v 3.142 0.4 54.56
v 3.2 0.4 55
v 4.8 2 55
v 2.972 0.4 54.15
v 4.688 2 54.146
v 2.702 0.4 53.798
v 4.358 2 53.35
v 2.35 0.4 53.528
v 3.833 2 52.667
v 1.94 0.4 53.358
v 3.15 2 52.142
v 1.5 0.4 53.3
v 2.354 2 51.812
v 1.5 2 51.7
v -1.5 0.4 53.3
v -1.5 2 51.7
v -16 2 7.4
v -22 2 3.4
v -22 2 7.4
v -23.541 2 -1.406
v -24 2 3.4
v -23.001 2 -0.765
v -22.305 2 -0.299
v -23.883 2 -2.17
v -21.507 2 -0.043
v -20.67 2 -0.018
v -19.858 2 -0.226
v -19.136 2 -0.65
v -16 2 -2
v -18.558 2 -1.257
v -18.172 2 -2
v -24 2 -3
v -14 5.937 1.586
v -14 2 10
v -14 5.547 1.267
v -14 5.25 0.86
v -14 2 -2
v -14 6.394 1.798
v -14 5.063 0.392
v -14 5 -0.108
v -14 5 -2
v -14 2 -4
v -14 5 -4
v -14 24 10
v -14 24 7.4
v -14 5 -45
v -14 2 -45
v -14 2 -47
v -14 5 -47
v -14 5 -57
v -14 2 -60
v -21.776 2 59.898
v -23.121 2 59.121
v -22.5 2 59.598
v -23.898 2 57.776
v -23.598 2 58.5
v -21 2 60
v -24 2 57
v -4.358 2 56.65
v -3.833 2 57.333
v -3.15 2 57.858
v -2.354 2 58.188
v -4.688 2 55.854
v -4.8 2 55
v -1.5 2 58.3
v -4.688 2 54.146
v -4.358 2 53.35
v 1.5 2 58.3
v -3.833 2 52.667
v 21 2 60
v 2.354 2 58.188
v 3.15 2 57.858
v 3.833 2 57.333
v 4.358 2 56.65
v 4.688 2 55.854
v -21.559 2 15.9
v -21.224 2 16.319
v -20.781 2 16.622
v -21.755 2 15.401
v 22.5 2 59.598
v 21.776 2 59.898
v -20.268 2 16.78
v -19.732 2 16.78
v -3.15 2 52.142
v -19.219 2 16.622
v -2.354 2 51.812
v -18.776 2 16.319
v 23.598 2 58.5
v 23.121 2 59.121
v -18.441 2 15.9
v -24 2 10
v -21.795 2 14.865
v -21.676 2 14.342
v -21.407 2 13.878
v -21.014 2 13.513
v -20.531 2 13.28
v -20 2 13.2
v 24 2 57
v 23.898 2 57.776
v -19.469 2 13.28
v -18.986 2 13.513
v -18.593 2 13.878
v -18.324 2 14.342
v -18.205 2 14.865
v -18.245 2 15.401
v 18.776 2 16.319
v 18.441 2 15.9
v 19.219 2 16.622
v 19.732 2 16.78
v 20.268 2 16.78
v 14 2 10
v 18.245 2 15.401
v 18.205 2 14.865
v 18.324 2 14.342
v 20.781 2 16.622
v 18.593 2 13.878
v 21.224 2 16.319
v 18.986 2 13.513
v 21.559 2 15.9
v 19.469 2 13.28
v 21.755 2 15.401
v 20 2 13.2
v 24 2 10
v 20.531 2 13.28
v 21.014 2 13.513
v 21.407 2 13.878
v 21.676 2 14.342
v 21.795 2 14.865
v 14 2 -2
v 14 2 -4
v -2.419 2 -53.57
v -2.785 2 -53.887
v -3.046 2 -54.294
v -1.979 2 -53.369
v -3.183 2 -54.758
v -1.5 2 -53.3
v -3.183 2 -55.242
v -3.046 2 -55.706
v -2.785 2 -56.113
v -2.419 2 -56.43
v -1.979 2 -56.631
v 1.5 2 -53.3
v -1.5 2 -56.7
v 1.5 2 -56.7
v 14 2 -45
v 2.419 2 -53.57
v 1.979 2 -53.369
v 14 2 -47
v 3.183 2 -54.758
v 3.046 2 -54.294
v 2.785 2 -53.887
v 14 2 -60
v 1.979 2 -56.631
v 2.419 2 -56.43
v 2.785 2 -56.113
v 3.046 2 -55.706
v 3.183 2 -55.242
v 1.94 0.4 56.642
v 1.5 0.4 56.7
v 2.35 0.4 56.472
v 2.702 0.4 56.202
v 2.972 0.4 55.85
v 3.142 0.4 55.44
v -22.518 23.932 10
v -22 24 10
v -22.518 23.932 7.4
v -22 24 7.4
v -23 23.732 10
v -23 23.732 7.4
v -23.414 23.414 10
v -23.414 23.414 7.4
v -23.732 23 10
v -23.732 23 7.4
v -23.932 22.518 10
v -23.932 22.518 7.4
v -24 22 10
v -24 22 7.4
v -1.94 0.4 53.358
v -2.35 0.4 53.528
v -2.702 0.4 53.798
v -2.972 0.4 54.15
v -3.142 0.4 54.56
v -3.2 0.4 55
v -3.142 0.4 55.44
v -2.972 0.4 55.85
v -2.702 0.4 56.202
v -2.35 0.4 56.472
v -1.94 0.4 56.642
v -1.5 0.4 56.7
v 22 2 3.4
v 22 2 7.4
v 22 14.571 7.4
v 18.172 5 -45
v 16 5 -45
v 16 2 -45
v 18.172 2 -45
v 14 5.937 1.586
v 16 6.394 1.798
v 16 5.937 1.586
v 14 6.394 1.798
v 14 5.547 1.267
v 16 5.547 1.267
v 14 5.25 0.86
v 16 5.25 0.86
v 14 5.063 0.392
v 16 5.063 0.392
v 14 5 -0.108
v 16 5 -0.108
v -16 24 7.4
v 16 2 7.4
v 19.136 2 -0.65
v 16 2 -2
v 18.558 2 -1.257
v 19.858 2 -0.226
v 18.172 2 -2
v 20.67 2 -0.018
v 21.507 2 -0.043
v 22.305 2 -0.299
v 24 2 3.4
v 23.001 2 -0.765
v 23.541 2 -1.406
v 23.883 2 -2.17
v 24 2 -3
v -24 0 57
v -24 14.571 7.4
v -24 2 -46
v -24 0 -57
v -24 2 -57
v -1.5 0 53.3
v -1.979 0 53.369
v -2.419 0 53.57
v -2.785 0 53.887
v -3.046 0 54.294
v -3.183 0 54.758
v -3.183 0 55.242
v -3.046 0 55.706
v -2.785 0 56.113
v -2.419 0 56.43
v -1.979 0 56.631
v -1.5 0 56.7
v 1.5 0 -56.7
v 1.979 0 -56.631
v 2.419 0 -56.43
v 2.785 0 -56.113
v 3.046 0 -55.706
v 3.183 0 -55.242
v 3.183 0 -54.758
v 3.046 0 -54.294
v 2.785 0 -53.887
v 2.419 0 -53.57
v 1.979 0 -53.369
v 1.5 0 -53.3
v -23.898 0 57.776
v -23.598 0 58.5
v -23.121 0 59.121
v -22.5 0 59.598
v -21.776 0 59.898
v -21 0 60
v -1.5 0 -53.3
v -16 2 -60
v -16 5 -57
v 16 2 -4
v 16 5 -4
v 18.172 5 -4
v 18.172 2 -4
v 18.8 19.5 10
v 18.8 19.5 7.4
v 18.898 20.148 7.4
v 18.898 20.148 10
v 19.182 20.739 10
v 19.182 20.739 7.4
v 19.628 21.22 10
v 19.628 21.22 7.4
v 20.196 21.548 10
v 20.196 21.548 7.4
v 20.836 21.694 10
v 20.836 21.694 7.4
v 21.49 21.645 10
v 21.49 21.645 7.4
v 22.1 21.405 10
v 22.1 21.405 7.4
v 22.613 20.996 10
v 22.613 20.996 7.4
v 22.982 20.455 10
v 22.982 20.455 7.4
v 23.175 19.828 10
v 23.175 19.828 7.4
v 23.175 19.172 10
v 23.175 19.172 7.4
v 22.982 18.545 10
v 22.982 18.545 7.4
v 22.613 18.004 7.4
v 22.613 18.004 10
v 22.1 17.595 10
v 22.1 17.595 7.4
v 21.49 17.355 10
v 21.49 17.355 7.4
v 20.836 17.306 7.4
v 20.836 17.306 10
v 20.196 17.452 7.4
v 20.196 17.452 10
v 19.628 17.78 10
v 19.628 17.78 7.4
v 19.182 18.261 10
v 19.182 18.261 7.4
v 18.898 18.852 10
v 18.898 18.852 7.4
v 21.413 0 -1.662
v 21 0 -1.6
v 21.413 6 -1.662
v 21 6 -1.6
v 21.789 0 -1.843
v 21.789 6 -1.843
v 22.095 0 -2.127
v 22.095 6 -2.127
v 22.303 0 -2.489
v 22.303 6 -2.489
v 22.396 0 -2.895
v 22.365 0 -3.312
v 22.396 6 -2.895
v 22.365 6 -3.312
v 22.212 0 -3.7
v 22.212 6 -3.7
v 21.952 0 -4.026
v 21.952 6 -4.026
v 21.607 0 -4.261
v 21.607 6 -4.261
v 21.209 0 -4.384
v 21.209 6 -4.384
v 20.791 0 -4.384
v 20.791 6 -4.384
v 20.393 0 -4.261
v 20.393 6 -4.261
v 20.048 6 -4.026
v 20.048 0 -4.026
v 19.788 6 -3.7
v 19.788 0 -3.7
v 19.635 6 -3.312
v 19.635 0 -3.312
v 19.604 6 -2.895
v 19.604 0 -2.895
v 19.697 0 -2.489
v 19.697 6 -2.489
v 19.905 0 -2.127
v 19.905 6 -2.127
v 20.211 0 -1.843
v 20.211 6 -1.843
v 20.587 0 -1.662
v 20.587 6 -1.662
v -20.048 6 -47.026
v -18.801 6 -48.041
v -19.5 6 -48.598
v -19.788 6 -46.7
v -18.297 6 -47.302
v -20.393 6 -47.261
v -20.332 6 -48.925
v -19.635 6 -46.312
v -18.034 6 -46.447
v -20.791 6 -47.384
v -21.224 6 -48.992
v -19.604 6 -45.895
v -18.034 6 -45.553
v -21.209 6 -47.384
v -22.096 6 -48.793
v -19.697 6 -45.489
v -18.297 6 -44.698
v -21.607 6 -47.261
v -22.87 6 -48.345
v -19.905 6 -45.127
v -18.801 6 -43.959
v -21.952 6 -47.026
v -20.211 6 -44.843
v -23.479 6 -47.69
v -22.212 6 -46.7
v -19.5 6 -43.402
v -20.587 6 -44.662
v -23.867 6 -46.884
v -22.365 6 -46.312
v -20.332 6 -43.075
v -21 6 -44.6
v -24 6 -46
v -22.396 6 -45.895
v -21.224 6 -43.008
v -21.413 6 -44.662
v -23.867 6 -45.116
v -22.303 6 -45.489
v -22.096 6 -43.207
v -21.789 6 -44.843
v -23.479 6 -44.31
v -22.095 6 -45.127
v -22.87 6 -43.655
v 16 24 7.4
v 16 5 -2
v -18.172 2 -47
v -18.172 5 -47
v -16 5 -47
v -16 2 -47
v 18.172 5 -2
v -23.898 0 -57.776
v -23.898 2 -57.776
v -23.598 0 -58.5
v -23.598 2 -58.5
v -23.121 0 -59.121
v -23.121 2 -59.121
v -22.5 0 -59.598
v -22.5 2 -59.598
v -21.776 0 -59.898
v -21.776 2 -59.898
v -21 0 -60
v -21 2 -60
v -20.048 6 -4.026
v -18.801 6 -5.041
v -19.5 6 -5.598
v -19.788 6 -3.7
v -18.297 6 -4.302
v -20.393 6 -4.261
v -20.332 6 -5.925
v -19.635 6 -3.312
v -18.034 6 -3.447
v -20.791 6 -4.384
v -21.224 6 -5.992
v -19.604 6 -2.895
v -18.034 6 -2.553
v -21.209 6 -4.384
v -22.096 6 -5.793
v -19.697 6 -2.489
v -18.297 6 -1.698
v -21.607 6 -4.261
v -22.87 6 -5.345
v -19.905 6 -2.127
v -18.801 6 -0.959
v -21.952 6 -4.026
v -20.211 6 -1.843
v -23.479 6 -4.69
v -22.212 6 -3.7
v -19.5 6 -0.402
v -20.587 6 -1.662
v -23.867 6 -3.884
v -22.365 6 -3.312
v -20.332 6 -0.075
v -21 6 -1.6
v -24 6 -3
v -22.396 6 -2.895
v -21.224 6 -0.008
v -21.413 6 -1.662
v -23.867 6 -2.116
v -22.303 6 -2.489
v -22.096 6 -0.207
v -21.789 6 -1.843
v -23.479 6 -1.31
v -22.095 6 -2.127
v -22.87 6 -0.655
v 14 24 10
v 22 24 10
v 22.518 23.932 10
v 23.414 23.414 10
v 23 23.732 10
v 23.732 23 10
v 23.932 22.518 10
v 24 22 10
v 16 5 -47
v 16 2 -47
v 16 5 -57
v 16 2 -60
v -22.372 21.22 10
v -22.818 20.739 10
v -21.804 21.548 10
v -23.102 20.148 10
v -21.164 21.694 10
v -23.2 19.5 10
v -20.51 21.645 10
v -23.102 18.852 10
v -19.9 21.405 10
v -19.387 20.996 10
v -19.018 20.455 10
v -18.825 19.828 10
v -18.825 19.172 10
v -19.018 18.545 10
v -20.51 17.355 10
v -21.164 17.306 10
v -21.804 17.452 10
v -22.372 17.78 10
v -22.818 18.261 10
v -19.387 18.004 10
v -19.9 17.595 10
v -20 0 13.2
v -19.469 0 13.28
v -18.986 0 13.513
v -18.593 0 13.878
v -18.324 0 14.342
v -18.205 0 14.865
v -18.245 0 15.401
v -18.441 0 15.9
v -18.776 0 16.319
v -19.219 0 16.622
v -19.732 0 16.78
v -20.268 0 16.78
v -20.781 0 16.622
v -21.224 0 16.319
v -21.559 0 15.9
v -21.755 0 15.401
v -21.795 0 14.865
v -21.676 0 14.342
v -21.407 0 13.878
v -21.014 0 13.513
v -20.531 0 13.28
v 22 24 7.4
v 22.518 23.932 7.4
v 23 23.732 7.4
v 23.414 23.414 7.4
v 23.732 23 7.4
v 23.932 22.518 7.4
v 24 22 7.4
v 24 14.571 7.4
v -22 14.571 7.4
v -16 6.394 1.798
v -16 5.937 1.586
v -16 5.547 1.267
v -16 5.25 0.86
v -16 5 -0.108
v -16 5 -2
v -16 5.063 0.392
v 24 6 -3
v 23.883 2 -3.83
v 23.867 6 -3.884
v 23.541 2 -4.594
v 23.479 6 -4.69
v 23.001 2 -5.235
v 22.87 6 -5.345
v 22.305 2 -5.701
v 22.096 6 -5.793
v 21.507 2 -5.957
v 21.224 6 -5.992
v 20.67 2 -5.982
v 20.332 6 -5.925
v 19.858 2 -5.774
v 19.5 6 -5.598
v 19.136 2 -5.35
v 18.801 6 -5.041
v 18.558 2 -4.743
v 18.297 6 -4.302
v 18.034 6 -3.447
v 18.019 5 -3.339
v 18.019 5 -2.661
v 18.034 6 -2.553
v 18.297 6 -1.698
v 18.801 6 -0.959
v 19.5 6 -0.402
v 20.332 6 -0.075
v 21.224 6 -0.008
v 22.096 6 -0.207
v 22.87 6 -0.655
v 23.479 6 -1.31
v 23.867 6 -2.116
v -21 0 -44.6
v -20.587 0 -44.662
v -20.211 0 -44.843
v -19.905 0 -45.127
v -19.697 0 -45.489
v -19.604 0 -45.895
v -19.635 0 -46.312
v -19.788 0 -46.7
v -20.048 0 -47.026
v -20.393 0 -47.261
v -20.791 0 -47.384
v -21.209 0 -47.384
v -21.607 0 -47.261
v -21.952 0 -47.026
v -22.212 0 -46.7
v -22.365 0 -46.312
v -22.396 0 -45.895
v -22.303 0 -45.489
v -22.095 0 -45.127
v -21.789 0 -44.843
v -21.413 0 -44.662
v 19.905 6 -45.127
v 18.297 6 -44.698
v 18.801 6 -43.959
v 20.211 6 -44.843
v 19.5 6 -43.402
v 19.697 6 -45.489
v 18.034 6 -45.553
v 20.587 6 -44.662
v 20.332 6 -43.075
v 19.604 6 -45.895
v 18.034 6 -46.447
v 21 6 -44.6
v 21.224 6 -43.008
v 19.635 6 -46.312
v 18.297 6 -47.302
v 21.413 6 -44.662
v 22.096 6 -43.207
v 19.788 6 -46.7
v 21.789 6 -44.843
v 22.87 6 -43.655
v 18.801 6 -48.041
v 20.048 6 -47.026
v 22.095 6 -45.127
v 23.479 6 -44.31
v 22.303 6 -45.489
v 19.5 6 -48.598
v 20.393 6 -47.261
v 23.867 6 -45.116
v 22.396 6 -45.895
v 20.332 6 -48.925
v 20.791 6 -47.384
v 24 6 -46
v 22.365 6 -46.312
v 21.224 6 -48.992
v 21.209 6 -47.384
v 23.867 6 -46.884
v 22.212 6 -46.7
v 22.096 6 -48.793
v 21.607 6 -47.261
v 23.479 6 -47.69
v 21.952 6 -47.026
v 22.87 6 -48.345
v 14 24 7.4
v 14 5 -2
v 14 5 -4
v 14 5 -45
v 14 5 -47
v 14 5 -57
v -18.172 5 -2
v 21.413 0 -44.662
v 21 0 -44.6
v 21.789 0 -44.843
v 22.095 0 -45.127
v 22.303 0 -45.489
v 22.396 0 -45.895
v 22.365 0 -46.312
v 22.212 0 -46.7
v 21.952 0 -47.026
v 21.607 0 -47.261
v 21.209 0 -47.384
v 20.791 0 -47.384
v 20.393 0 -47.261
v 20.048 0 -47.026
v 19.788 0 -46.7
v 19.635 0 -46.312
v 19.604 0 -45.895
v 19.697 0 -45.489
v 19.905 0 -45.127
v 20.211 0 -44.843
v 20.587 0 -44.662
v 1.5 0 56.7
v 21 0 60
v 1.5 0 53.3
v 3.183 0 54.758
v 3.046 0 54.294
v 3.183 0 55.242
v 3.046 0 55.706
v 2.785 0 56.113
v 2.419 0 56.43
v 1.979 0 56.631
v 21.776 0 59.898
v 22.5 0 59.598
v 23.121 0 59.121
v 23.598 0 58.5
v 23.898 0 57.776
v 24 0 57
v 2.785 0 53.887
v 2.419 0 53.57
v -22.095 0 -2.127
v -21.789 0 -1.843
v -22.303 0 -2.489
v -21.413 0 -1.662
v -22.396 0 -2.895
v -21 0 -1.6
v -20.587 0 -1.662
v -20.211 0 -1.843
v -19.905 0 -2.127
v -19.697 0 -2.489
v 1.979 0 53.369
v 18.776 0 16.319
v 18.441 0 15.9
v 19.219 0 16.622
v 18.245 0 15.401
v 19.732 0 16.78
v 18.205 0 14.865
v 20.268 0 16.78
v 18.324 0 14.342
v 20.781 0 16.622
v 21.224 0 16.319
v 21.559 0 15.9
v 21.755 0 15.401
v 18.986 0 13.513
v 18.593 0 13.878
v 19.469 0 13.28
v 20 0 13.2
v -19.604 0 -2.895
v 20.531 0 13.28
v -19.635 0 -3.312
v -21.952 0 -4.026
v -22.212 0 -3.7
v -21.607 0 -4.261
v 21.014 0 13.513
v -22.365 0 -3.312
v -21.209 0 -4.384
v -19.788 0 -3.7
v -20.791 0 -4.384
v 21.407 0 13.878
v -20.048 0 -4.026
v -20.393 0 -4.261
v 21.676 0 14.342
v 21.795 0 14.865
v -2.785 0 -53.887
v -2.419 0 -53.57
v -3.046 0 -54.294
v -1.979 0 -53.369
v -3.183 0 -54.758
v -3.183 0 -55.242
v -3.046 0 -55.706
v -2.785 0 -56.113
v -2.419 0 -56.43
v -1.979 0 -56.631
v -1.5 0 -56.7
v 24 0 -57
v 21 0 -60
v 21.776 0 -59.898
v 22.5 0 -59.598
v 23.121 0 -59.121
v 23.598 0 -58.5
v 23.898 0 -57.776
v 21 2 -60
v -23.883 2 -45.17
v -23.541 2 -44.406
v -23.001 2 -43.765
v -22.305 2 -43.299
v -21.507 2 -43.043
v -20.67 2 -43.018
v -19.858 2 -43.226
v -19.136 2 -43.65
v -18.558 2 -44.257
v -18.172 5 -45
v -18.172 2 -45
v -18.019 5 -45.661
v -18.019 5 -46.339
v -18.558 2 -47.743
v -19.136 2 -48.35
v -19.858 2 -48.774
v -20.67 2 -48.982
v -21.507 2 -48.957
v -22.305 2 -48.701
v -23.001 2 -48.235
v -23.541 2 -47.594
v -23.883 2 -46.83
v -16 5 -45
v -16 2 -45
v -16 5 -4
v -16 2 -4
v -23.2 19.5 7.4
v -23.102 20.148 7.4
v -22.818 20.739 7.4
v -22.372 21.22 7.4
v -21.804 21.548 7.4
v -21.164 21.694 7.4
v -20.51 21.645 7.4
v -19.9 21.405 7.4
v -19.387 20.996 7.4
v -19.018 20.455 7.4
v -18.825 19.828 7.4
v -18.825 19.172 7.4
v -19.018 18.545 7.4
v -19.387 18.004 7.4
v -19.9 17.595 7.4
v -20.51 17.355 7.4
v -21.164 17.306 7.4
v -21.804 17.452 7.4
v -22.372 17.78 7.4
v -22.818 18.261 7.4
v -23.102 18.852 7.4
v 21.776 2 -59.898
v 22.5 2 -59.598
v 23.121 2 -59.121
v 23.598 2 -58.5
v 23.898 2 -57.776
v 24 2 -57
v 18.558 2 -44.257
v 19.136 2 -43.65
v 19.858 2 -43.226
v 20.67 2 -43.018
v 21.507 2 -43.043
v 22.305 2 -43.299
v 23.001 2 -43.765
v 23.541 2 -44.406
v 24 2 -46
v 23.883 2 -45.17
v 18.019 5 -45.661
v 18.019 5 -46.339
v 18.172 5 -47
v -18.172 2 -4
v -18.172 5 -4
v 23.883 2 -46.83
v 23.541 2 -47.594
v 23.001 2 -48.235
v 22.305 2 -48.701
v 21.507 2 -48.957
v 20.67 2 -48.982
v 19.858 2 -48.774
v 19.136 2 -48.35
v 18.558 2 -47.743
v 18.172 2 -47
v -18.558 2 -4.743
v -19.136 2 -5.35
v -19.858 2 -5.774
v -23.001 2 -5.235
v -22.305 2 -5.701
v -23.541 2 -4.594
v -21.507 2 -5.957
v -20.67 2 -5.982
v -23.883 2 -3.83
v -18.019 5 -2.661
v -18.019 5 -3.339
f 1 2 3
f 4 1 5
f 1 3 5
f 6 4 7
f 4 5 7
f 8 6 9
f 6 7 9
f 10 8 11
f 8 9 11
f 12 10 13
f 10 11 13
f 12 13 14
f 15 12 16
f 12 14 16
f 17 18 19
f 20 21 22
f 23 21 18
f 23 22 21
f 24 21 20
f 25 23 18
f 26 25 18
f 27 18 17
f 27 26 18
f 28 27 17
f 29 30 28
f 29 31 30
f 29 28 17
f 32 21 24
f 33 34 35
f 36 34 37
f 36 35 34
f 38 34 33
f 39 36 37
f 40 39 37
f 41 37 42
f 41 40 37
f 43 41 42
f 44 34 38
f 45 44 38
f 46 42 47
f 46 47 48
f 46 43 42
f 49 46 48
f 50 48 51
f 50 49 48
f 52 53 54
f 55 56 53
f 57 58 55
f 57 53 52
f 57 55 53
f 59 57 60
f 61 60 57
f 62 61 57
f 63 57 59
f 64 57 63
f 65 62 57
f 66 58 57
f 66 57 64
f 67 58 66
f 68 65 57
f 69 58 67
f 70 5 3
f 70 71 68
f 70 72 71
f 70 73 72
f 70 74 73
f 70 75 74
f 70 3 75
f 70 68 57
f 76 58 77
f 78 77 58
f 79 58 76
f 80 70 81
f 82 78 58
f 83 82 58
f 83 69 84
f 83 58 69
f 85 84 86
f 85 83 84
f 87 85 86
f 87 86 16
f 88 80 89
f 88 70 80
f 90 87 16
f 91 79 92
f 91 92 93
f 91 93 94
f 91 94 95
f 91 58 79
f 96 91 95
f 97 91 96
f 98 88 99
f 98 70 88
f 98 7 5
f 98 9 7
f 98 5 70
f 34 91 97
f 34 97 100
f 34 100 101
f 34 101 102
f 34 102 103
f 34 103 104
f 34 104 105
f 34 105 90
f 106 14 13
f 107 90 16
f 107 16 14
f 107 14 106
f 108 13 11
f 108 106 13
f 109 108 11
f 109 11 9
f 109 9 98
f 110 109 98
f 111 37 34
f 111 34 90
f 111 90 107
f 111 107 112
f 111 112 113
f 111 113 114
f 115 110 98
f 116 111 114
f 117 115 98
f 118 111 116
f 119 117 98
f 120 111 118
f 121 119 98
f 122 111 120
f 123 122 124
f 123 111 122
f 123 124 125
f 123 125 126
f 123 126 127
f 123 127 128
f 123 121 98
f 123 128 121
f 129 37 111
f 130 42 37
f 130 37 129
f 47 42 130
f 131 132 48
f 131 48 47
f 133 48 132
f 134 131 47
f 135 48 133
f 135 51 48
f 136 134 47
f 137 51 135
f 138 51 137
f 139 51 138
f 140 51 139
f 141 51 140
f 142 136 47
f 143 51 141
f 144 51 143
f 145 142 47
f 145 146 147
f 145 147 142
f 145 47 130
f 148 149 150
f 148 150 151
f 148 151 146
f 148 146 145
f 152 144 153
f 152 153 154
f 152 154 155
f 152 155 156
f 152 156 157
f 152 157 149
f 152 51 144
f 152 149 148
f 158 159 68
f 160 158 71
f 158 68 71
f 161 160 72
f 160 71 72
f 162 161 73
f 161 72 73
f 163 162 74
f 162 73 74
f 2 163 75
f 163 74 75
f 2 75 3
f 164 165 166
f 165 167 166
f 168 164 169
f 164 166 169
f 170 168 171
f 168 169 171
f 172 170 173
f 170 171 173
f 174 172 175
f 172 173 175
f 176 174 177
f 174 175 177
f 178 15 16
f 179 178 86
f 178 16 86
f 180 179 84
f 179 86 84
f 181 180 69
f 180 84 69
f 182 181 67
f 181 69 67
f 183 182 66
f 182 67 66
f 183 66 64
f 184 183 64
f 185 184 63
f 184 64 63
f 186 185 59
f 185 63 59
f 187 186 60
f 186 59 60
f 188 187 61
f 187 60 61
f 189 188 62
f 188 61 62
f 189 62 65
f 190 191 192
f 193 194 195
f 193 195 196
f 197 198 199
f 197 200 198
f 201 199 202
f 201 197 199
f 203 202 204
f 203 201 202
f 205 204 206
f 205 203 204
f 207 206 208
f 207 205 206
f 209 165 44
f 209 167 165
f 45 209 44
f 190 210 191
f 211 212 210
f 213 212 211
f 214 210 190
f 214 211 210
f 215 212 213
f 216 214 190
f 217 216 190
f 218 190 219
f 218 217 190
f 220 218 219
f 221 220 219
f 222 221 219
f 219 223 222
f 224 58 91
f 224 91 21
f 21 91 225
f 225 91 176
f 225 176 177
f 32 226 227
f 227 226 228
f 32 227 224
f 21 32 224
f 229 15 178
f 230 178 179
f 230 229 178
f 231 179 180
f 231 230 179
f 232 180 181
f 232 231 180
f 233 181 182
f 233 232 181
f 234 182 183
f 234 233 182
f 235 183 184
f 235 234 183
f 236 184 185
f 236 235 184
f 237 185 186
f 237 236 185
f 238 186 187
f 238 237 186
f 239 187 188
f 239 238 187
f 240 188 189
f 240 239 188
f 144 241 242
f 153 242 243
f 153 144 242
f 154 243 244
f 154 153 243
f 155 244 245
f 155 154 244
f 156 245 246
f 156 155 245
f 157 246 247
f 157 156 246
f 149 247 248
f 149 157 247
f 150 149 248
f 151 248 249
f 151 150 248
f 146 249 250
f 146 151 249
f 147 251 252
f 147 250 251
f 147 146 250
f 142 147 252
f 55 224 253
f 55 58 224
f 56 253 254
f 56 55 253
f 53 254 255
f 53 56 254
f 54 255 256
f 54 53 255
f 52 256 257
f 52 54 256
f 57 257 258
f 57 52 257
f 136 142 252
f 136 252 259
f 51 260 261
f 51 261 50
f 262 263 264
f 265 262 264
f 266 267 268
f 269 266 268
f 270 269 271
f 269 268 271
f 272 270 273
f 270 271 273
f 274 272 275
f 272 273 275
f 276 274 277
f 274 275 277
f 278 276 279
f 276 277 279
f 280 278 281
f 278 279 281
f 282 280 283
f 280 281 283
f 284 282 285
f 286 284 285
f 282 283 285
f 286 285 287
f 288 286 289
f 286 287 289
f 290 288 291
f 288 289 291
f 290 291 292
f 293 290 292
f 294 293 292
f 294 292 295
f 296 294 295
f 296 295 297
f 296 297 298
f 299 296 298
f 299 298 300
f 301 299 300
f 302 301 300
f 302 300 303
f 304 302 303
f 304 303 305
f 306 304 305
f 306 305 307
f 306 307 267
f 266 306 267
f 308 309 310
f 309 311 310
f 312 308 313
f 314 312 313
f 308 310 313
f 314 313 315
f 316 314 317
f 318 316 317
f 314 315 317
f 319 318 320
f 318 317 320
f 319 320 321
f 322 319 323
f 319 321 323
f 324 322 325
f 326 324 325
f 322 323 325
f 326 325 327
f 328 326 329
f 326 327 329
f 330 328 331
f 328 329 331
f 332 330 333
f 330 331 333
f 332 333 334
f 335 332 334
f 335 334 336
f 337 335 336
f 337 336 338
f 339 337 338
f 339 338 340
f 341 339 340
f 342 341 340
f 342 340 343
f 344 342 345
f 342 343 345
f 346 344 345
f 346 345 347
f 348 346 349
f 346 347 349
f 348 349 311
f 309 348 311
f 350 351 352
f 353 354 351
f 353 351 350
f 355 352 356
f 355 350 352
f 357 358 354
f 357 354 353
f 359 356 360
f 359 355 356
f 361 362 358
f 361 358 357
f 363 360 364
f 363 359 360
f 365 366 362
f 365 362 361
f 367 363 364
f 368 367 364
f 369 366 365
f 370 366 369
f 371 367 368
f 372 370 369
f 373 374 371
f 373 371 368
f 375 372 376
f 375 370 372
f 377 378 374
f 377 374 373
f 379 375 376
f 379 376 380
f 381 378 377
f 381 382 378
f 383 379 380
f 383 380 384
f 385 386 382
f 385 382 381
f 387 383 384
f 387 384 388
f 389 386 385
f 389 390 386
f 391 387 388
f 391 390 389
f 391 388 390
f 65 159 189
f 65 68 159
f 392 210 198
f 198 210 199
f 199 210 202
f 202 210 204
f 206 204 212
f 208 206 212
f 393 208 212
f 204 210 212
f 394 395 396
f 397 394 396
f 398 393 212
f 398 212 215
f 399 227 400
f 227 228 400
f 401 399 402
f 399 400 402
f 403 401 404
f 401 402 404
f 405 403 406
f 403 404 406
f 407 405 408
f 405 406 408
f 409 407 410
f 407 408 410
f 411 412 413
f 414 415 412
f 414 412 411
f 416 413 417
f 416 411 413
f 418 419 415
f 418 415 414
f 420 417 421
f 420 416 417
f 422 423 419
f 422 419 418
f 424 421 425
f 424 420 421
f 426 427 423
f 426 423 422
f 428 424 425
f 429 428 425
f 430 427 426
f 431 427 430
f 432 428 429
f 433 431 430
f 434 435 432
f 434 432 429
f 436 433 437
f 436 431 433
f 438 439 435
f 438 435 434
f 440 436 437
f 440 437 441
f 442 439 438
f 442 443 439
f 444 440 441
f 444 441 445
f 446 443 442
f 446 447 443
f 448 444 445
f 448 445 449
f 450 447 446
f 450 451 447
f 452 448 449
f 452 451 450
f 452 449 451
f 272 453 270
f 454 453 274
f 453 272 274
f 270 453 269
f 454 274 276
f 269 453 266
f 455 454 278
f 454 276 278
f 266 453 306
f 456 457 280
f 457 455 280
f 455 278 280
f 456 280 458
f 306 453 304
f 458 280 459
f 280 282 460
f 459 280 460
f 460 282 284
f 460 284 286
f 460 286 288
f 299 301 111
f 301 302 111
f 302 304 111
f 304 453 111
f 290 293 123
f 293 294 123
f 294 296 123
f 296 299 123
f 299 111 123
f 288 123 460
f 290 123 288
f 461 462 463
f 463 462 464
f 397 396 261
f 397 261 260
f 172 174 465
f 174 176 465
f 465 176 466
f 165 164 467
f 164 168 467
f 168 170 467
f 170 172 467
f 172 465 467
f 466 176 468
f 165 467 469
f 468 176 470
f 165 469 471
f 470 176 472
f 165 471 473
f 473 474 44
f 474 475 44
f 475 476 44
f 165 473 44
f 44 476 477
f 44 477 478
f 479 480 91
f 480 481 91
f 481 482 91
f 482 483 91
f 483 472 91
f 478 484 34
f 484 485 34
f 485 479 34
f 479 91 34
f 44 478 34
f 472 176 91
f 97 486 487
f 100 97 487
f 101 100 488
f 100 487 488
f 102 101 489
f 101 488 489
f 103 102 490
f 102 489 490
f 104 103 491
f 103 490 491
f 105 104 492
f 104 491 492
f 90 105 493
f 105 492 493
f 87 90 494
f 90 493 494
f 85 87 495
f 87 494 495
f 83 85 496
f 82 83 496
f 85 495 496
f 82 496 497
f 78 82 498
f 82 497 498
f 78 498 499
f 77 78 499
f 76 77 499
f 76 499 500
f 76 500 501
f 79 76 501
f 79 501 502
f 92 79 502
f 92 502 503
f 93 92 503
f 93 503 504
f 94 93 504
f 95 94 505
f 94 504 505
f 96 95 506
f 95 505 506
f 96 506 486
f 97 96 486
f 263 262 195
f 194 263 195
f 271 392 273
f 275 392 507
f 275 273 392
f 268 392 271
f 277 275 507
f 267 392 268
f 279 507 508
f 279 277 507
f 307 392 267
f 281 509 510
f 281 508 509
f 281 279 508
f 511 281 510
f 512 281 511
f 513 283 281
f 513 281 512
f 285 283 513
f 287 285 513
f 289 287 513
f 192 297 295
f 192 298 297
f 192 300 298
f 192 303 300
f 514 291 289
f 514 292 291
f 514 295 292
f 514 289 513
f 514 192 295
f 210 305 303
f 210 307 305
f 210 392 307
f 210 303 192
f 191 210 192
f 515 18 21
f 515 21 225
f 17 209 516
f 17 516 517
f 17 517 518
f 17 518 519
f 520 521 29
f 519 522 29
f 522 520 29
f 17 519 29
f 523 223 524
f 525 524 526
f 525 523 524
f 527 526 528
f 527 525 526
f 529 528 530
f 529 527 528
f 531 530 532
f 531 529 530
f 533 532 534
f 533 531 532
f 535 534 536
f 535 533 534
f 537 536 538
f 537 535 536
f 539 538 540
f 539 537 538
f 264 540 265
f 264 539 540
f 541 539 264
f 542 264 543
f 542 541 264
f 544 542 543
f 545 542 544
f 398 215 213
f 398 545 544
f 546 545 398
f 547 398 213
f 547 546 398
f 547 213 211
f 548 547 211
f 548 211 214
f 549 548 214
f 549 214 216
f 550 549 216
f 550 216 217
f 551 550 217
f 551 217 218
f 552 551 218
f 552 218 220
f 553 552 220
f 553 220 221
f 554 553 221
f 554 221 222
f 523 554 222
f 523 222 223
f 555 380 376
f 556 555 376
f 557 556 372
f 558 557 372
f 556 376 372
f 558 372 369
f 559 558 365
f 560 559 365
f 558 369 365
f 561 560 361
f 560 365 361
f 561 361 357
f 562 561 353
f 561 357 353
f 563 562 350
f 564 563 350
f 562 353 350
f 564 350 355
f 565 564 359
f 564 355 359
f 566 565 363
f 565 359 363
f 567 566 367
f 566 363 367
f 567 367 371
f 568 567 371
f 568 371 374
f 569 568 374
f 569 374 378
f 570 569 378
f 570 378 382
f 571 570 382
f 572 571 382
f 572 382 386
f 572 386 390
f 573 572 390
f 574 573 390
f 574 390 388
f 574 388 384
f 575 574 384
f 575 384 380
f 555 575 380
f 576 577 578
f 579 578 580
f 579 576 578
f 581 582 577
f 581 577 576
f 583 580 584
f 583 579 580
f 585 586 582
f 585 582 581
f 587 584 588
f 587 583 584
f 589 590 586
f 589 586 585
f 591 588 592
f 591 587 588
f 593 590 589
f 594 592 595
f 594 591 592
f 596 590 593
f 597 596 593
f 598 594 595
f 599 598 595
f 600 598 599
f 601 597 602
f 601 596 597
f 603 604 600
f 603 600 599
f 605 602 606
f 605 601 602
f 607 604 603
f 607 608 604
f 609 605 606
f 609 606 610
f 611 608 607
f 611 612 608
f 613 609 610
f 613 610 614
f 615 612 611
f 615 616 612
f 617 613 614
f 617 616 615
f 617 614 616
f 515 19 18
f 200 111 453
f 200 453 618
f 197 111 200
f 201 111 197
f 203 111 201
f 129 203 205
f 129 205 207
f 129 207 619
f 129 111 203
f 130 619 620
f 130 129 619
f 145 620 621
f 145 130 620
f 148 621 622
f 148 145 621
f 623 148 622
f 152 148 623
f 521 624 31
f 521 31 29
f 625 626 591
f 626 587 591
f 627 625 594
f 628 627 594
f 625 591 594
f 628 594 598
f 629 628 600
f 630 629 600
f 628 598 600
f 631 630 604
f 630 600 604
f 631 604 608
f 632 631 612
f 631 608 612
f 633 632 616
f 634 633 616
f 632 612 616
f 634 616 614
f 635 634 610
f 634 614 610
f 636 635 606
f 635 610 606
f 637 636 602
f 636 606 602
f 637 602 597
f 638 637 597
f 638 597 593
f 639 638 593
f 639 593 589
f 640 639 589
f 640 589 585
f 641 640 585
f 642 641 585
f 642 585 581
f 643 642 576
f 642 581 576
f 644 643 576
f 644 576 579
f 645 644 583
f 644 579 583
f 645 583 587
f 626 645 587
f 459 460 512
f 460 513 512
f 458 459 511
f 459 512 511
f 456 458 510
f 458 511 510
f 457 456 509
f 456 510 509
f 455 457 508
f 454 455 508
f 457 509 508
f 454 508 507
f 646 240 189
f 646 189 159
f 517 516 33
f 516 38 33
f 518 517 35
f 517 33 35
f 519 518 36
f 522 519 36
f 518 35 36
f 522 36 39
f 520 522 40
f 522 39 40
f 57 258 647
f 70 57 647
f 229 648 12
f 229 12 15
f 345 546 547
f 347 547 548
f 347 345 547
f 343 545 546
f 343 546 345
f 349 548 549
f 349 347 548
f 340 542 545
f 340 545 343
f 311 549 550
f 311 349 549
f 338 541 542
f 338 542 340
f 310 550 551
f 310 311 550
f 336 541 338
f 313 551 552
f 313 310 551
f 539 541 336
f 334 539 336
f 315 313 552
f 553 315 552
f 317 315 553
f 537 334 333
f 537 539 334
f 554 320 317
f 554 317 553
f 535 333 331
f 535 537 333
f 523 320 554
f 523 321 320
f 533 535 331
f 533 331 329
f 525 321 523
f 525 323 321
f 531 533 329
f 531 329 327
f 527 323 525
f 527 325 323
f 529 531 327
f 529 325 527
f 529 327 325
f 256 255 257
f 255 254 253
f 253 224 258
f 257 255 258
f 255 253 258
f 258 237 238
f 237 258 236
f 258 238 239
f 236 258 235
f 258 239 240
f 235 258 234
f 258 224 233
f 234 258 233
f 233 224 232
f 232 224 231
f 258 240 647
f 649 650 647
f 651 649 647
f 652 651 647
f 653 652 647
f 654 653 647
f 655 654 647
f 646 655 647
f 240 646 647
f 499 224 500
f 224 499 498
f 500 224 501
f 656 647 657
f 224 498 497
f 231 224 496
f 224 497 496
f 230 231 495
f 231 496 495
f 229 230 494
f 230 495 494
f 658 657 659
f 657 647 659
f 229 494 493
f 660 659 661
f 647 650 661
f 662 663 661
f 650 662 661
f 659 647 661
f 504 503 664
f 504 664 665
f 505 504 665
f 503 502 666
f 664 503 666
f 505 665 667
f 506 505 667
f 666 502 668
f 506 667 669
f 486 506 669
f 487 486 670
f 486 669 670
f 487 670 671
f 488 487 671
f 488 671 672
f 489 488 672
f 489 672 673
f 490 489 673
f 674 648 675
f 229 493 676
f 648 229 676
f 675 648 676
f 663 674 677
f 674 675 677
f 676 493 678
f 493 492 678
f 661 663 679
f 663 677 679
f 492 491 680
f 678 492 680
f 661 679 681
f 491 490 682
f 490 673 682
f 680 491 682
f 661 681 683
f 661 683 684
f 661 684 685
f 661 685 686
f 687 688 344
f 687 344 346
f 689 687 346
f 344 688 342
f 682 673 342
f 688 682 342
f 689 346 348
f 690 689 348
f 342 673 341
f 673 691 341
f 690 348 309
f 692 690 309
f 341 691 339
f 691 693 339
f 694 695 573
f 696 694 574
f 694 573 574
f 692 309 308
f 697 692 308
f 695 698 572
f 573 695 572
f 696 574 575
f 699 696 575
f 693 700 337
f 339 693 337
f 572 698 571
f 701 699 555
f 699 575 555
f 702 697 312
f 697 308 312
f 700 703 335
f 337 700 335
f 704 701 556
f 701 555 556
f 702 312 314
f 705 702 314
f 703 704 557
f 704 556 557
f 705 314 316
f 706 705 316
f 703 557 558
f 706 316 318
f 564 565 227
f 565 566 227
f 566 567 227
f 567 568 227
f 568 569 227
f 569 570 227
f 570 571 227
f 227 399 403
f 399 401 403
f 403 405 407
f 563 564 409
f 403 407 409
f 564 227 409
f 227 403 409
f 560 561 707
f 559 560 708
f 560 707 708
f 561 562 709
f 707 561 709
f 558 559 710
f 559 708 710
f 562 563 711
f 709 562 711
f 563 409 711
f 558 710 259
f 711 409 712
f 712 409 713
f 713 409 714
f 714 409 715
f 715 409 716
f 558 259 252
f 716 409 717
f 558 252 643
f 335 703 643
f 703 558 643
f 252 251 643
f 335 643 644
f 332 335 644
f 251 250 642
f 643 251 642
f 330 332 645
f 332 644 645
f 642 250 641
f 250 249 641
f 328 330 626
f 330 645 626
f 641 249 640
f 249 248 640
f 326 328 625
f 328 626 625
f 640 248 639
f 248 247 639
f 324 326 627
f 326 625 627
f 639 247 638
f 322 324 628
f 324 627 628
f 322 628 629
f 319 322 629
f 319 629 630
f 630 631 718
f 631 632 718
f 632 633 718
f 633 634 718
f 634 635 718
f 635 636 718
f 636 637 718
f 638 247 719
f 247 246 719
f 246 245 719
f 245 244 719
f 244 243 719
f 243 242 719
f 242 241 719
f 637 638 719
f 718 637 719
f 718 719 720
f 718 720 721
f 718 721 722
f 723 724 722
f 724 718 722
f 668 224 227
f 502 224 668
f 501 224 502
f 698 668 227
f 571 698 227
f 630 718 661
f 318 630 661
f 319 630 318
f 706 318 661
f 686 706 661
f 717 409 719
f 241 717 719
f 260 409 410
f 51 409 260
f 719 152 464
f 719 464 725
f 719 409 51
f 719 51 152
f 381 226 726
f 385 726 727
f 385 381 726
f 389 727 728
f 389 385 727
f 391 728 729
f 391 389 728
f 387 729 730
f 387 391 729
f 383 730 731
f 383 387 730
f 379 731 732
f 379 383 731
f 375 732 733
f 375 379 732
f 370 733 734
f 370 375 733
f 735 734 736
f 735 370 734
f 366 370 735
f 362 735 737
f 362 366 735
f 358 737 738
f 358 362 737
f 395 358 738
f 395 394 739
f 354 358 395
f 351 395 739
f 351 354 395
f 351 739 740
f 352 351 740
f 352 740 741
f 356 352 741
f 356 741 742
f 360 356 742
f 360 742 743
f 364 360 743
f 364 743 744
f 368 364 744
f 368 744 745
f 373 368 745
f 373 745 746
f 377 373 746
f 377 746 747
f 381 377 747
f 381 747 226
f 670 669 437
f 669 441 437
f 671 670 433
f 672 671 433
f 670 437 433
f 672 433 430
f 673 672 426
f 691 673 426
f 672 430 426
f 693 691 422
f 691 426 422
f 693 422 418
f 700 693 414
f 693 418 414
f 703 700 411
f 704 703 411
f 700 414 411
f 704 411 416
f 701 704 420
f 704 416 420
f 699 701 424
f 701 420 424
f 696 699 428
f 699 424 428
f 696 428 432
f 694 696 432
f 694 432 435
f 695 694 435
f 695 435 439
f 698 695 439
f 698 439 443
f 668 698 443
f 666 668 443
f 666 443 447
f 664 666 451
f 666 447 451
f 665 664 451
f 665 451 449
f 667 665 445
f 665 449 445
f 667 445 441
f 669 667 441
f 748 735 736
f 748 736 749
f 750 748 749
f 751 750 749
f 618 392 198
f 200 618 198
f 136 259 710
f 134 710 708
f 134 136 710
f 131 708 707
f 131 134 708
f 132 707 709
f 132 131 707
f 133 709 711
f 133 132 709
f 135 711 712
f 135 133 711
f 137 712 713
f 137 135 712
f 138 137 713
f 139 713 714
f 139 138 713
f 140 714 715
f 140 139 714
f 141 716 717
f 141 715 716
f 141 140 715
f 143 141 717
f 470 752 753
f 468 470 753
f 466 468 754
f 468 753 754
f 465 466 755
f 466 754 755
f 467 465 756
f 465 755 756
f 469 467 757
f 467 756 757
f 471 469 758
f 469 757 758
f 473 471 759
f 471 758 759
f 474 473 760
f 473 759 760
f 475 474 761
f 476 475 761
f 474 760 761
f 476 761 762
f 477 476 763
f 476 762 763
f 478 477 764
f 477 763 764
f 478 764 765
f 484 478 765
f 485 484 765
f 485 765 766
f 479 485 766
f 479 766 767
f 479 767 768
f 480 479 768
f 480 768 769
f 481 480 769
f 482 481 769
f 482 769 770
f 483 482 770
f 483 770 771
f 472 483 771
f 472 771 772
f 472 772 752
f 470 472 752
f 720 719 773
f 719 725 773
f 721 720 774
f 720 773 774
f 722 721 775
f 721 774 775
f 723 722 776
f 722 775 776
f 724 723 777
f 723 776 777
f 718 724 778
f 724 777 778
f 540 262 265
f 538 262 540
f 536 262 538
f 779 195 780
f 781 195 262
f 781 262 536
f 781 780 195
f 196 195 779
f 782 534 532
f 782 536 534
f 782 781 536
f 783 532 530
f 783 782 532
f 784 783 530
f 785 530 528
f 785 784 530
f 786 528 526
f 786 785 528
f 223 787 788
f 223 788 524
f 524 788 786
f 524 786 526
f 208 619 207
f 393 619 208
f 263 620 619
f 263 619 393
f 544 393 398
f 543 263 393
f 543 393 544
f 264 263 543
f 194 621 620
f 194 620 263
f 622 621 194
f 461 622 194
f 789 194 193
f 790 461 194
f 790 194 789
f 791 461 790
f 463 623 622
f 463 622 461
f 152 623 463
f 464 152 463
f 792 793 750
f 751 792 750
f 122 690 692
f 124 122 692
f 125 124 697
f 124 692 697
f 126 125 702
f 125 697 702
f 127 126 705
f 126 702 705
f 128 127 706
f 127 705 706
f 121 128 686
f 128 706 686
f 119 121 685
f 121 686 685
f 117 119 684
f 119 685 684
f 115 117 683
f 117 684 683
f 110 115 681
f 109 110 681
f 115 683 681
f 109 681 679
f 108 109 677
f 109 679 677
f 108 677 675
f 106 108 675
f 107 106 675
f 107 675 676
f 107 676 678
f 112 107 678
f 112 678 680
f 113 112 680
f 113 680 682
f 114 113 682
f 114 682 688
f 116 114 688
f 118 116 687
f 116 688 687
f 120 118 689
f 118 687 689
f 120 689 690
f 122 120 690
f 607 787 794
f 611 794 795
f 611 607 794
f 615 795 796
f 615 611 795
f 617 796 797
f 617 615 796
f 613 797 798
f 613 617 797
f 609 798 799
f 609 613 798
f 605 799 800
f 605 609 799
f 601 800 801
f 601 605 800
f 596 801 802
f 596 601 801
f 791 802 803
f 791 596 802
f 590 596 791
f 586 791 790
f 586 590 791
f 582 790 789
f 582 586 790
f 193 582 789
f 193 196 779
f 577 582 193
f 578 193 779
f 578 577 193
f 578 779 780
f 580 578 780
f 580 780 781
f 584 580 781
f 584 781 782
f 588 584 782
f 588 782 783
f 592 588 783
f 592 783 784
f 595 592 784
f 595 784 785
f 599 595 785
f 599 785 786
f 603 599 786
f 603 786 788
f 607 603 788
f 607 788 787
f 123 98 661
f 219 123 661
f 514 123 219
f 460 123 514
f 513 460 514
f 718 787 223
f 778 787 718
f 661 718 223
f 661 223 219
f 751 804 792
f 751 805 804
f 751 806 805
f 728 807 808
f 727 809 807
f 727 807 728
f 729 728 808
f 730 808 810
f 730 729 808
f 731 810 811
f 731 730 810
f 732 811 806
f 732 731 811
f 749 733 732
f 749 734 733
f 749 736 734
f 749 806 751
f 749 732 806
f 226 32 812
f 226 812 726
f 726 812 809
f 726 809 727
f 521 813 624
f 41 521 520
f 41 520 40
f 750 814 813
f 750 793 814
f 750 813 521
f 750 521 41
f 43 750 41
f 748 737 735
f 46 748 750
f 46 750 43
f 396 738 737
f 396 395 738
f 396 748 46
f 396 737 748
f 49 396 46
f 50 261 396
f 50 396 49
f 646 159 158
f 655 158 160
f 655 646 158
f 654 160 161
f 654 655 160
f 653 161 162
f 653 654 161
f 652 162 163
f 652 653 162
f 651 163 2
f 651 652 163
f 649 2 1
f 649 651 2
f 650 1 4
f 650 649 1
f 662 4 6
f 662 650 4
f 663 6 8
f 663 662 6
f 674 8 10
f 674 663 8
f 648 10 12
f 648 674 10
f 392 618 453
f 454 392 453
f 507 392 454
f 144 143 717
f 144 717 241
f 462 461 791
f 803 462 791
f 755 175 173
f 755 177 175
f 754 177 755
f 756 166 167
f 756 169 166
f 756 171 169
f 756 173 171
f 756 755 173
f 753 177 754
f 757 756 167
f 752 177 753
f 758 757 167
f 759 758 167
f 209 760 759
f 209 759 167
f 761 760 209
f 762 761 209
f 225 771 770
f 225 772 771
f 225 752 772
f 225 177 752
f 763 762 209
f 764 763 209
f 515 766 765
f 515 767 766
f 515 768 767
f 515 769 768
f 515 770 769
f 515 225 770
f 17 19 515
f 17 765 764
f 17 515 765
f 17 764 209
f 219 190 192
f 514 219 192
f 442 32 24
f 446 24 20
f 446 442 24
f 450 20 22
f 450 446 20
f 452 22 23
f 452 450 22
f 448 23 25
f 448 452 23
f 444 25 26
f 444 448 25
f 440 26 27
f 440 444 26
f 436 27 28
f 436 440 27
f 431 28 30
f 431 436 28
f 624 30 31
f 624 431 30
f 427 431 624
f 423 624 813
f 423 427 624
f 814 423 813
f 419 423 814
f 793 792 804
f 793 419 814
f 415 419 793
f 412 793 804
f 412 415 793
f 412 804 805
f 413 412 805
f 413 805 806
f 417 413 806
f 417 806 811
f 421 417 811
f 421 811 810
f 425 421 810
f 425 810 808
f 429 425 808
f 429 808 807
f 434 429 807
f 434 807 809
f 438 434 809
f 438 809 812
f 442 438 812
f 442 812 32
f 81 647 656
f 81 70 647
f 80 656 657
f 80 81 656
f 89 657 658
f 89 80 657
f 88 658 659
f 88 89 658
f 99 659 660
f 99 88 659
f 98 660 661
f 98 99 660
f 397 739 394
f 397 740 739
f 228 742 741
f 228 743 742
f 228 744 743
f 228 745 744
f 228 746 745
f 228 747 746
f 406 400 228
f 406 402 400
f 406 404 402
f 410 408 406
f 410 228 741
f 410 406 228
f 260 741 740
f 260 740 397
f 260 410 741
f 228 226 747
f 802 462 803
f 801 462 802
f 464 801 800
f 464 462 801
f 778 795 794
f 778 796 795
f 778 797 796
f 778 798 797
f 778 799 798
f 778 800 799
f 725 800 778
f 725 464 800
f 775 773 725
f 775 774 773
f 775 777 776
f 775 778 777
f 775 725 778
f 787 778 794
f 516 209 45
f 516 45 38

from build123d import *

# Parameters (mm, degrees)
SKETCH_1_W             = 48
SKETCH_1_H             = 120
EXTRUDE_1_DEPTH        = 2
SKETCH_2_R             = 1.7
CUT_EXTRUDE_1_DEPTH    = 65.652919501
FILLET_1_R             = 3
SKETCH_3_R             = 1.8
CUT_EXTRUDE_2_DEPTH    = 2
SKETCH_4_W             = 10
SKETCH_4_H             = 2.6
EXTRUDE_2_DEPTH        = 22
RIB_6_REACH            = 76.967
SKETCH_5_WALL_W        = 175.020111274
SKETCH_5_WALL_H        = 2
SKETCH_6_R             = 2.2
CUT_EXTRUDE_3_DEPTH    = 76.463633626
FILLET_2_R             = 2
RIB_START              = -2
RIB_7_DEPTH            = 2
SKETCH_9_R             = 1.4
CUT_EXTRUDE_4_DEPTH    = 69.264192664
SKETCH_10_W            = 2
SKETCH_10_H            = 61.770189923
EXTRUDE_3_DEPTH        = 3
FILLET_3_R             = 2
CHAMFER_2_SIZE         = 3
HOLE_START             = -1
HOLE_WIZARD_M3_1_DEPTH = 4
EXTRUDE_START          = 4
SKETCH_14_R            = 3
SKETCH_14_R_2          = 1.4
EXTRUDE_4_DEPTH        = 4
SKETCH_15_W            = 4.171572875
SKETCH_15_H            = 2
EXTRUDE_5_DEPTH        = 3


with BuildPart() as part:
    # 草图1 → 凸台-拉伸1 (new body)
    with BuildSketch(Plane(origin=(0, 0, 0), x_dir=(1, 0, 0), z_dir=(0, 1, 0))):
        Rectangle(SKETCH_1_W, SKETCH_1_H)
    extrude(amount=EXTRUDE_1_DEPTH)

    # 草图2 → 切除-拉伸1 (cut, through all)
    with BuildSketch(Plane(origin=(0, 2, 0), x_dir=(1, 0, 0), z_dir=(0, 1, 0))):
        with Locations(Location((0, -55, 0), (0, 0, 90))):
            Circle(SKETCH_2_R)
        with BuildLine():
            Line((-1.5, 56.7), (1.5, 56.7))
            ThreePointArc((1.5, 56.7), (3.2, 55), (1.5, 53.3))
            Line((1.5, 53.3), (-1.5, 53.3))
            ThreePointArc((-1.5, 53.3), (-3.2, 55), (-1.5, 56.7))
        make_face()
    extrude(amount=-CUT_EXTRUDE_1_DEPTH, mode=Mode.SUBTRACT)

    # 圆角1
    fillet_1_edges = [part.edges().sort_by_distance(p)[0] for p in [
        (24, 1, 60),
        (-24, 1, 60),
        (-24, 1, -60),
        (24, 1, -60),
    ]]
    fillet(fillet_1_edges, radius=FILLET_1_R)

    # 草图3 → 切除-拉伸2 (cut)
    with BuildSketch(Plane(origin=(0, 0, 0), x_dir=(-1, 0, 0), z_dir=(0, -1, 0))):
        with Locations(Location((20, -15, 0), (0, 0, 90))):
            Circle(SKETCH_3_R)
        with Locations(Location((-20, -15, 0), (0, 0, 90))):
            Circle(SKETCH_3_R)
    extrude(amount=-CUT_EXTRUDE_2_DEPTH, mode=Mode.SUBTRACT)

    # 草图4 → 凸台-拉伸2 (add)
    with BuildSketch(Plane(origin=(0, 2, 0), x_dir=(1, 0, 0), z_dir=(0, 1, 0))):
        with Locations((19, -8.7)):
            Rectangle(SKETCH_4_W, SKETCH_4_H)
        with Locations((-19, -8.7)):
            Rectangle(SKETCH_4_W, SKETCH_4_H)
    extrude(amount=EXTRUDE_2_DEPTH)

    # 草图5 wall → 筋6 (add, up to next)
    with BuildSketch(Plane(origin=(14, 13, 3.9), x_dir=(0, -0.952925780013, -0.303203657277), z_dir=(0, -0.303203657277, 0.952925780013)), mode=Mode.PRIVATE) as rib_6_sk1:
        with Locations((0, 1)):
            Rectangle(SKETCH_5_WALL_W, SKETCH_5_WALL_H)
    rib_6_tool1 = extrude(rib_6_sk1.sketch, amount=RIB_6_REACH, mode=Mode.PRIVATE) - part.part
    rib_6 = rib_6_tool1.solids().sort_by_distance((14, 13, 3.9))[0]
    add(rib_6)

    # 镜向1: 筋6 across plane
    add(rib_6.mirror(Plane(origin=(0, 0, 0), x_dir=(0, 0, 1), z_dir=(1, 0, 0))))

    # 草图6 → 切除-拉伸3 (cut, through all)
    with BuildSketch(Plane(origin=(0, 0, 7.4), x_dir=(-1, 0, 0), z_dir=(0, 0, -1))):
        with Locations((-21, 19.5)):
            Circle(SKETCH_6_R)
        with Locations((21, 19.5)):
            Circle(SKETCH_6_R)
    extrude(amount=-CUT_EXTRUDE_3_DEPTH, mode=Mode.SUBTRACT)

    # 圆角2
    fillet_2_edges = [part.edges().sort_by_distance(p)[0] for p in [
        (24, 24, 8.7),
        (-24, 24, 8.7),
    ]]
    fillet(fillet_2_edges, radius=FILLET_2_R)

    # 筋7: read off the stored shape, not the designer's step
    # 筋7 outline → 筋7 (add)
    with BuildSketch(Plane(origin=(24, 0, 0), x_dir=(0, 0, -1), z_dir=(1, 0, 0)).offset(RIB_START)):
        Polygon((-3.4, 2), (-7.4, 14.571428571), (-7.4, 2), align=None)
    rib_7 = extrude(amount=RIB_7_DEPTH)

    # 镜向2: 筋7 across plane
    add(rib_7.mirror(Plane(origin=(0, 0, 0), x_dir=(0, 0, 1), z_dir=(1, 0, 0))))

    # 草图9 → 切除-拉伸4 (cut, through all)
    with BuildSketch(Plane(origin=(0, 2, 0), x_dir=(1, 0, 0), z_dir=(0, 1, 0))):
        with Locations(Location((-21, 46, 0), (0, 0, 270))):
            Circle(SKETCH_9_R)
        with Locations(Location((21, 46, 0), (0, 0, 270))):
            Circle(SKETCH_9_R)
        with Locations(Location((21, 3, 0), (0, 0, 270))):
            Circle(SKETCH_9_R)
        with Locations(Location((-21, 3, 0), (0, 0, 270))):
            Circle(SKETCH_9_R)
    extrude(amount=-CUT_EXTRUDE_4_DEPTH, mode=Mode.SUBTRACT)

    # 草图10 → 凸台-拉伸3 (add)
    with BuildSketch(Plane(origin=(0, 2, 0), x_dir=(1, 0, 0), z_dir=(0, 1, 0))):
        with Locations((-15, 29.114905039)):
            Rectangle(SKETCH_10_W, SKETCH_10_H)
        with Locations((15, 29.114905039)):
            Rectangle(SKETCH_10_W, SKETCH_10_H)
    extrude(amount=EXTRUDE_3_DEPTH)

    # 圆角3
    fillet_3_edges = [part.edges().sort_by_distance(p)[0] for p in [
        (-15, 5, 1.354545455),
        (15, 5, 1.354545455),
    ]]
    fillet(fillet_3_edges, radius=FILLET_3_R)

    # 倒角2
    chamfer_2_edges = [part.edges().sort_by_distance(p)[0] for p in [
        (15, 5, -60),
        (-15, 5, -60),
    ]]
    chamfer(chamfer_2_edges, length=CHAMFER_2_SIZE)

    # M3 十字槽沉头木螺钉的锥形沉头孔1: read off the stored shape, not the designer's step
    # M3 十字槽沉头木螺钉的锥形沉头孔1 outline → M3 十字槽沉头木螺钉的锥形沉头孔1 (cut)
    with BuildSketch(Plane(origin=(0, 0, 0), x_dir=(1, 0, 0), z_dir=(0, 1, 0)).offset(HOLE_START)):
        with BuildLine():
            Line((0, -56.7), (1.5, -56.7))
            ThreePointArc((1.5, -56.7), (3.2, -55), (1.5, -53.3))
            Line((1.5, -53.3), (0, -53.3))
            ThreePointArc((0, -53.3), (1.7, -55), (0, -56.7))
        make_face()
        with BuildLine():
            Line((-1.5, -56.7), (0, -56.7))
            ThreePointArc((0, -56.7), (-1.7, -55), (0, -53.3))
            Line((0, -53.3), (-1.5, -53.3))
            ThreePointArc((-1.5, -53.3), (-3.2, -55), (-1.5, -56.7))
        make_face()
    extrude(amount=HOLE_WIZARD_M3_1_DEPTH, mode=Mode.SUBTRACT)

    # Hole Wizard M3 _1 2: loft between two sections, ruled curve by curve
    hole_wizard_m3_1_2_from = [
        Edge.make_three_point_arc((1.5, 0.4, 56.7), (2.702081528, 0.4, 56.202081528), (3.2, 0.4, 55)),
        Edge.make_three_point_arc((3.2, 0.4, 55), (2.702081528, 0.4, 53.797918472), (1.5, 0.4, 53.3)),
        Edge.make_three_point_arc((-1.5, 0.4, 53.3), (-2.702081528, 0.4, 53.797918472), (-3.2, 0.4, 55)),
        Edge.make_three_point_arc((-3.2, 0.4, 55), (-2.702081528, 0.4, 56.202081528), (-1.5, 0.4, 56.7)),
        Edge.make_line((1.5, 0.4, 53.3), (-1.5, 0.4, 53.3)),
        Edge.make_line((1.5, 0.4, 56.7), (-1.5, 0.4, 56.7)),
    ]
    hole_wizard_m3_1_2_to = [
        Edge.make_three_point_arc((1.5, 2, 58.3), (3.833452378, 2, 57.333452378), (4.8, 2, 55)),
        Edge.make_three_point_arc((4.8, 2, 55), (3.833452378, 2, 52.666547622), (1.5, 2, 51.7)),
        Edge.make_three_point_arc((-1.5, 2, 51.7), (-3.833452378, 2, 52.666547622), (-4.8, 2, 55)),
        Edge.make_three_point_arc((-4.8, 2, 55), (-3.833452378, 2, 57.333452378), (-1.5, 2, 58.3)),
        Edge.make_line((1.5, 2, 51.7), (-1.5, 2, 51.7)),
        Edge.make_line((1.5, 2, 58.3), (-1.5, 2, 58.3)),
    ]
    hole_wizard_m3_1_2 = Solid(Shell([*[Face.make_surface_from_curves(hole_wizard_m3_1_2_from[k], hole_wizard_m3_1_2_to[k]) for k in range(6)], Face(Wire(hole_wizard_m3_1_2_from)), Face(Wire(hole_wizard_m3_1_2_to))]))
    add(hole_wizard_m3_1_2, mode=Mode.SUBTRACT)

    # 草图14 → 凸台-拉伸4 (add)
    # profile 1 of 4: a face of its own
    with BuildSketch(Plane(origin=(0, 2, 0), x_dir=(1, 0, 0), z_dir=(0, 1, 0)).offset(EXTRUDE_START)):
        with Locations(Location((-21, 46, 0), (0, 0, 180))):
            Circle(SKETCH_14_R)
        with Locations(Location((-21, 46, 0), (0, 0, 270))):
            Circle(SKETCH_14_R_2, mode=Mode.SUBTRACT)
    # profile 2 of 4: a face of its own
    with BuildSketch(Plane(origin=(0, 2, 0), x_dir=(1, 0, 0), z_dir=(0, 1, 0)).offset(EXTRUDE_START)):
        with Locations(Location((-21, 3, 0), (0, 0, 180))):
            Circle(SKETCH_14_R)
        with Locations(Location((-21, 3, 0), (0, 0, 270))):
            Circle(SKETCH_14_R_2, mode=Mode.SUBTRACT)
    # profile 3 of 4: a face of its own
    with BuildSketch(Plane(origin=(0, 2, 0), x_dir=(1, 0, 0), z_dir=(0, 1, 0)).offset(EXTRUDE_START)):
        with Locations((21, 46)):
            Circle(SKETCH_14_R)
        with Locations(Location((21, 46, 0), (0, 0, 270))):
            Circle(SKETCH_14_R_2, mode=Mode.SUBTRACT)
    # profile 4 of 4: a face of its own
    with BuildSketch(Plane(origin=(0, 2, 0), x_dir=(1, 0, 0), z_dir=(0, 1, 0)).offset(EXTRUDE_START)):
        with Locations((21, 3)):
            Circle(SKETCH_14_R)
        with Locations(Location((21, 3, 0), (0, 0, 270))):
            Circle(SKETCH_14_R_2, mode=Mode.SUBTRACT)
    extrude(amount=-EXTRUDE_4_DEPTH)

    # 草图15 → 凸台-拉伸5 (add)
    with BuildSketch(Plane(origin=(0, 5, 0), x_dir=(1, 0, 0), z_dir=(0, 1, 0))):
        with Locations((-16.085786438, 46)):
            Rectangle(SKETCH_15_W, SKETCH_15_H)
        with Locations((-16.085786438, 3)):
            Rectangle(SKETCH_15_W, SKETCH_15_H)
        with Locations((16.085786438, 3)):
            Rectangle(SKETCH_15_W, SKETCH_15_H)
        with Locations((16.085786438, 46)):
            Rectangle(SKETCH_15_W, SKETCH_15_H)
    extrude(amount=-EXTRUDE_5_DEPTH)


solid = part.part
